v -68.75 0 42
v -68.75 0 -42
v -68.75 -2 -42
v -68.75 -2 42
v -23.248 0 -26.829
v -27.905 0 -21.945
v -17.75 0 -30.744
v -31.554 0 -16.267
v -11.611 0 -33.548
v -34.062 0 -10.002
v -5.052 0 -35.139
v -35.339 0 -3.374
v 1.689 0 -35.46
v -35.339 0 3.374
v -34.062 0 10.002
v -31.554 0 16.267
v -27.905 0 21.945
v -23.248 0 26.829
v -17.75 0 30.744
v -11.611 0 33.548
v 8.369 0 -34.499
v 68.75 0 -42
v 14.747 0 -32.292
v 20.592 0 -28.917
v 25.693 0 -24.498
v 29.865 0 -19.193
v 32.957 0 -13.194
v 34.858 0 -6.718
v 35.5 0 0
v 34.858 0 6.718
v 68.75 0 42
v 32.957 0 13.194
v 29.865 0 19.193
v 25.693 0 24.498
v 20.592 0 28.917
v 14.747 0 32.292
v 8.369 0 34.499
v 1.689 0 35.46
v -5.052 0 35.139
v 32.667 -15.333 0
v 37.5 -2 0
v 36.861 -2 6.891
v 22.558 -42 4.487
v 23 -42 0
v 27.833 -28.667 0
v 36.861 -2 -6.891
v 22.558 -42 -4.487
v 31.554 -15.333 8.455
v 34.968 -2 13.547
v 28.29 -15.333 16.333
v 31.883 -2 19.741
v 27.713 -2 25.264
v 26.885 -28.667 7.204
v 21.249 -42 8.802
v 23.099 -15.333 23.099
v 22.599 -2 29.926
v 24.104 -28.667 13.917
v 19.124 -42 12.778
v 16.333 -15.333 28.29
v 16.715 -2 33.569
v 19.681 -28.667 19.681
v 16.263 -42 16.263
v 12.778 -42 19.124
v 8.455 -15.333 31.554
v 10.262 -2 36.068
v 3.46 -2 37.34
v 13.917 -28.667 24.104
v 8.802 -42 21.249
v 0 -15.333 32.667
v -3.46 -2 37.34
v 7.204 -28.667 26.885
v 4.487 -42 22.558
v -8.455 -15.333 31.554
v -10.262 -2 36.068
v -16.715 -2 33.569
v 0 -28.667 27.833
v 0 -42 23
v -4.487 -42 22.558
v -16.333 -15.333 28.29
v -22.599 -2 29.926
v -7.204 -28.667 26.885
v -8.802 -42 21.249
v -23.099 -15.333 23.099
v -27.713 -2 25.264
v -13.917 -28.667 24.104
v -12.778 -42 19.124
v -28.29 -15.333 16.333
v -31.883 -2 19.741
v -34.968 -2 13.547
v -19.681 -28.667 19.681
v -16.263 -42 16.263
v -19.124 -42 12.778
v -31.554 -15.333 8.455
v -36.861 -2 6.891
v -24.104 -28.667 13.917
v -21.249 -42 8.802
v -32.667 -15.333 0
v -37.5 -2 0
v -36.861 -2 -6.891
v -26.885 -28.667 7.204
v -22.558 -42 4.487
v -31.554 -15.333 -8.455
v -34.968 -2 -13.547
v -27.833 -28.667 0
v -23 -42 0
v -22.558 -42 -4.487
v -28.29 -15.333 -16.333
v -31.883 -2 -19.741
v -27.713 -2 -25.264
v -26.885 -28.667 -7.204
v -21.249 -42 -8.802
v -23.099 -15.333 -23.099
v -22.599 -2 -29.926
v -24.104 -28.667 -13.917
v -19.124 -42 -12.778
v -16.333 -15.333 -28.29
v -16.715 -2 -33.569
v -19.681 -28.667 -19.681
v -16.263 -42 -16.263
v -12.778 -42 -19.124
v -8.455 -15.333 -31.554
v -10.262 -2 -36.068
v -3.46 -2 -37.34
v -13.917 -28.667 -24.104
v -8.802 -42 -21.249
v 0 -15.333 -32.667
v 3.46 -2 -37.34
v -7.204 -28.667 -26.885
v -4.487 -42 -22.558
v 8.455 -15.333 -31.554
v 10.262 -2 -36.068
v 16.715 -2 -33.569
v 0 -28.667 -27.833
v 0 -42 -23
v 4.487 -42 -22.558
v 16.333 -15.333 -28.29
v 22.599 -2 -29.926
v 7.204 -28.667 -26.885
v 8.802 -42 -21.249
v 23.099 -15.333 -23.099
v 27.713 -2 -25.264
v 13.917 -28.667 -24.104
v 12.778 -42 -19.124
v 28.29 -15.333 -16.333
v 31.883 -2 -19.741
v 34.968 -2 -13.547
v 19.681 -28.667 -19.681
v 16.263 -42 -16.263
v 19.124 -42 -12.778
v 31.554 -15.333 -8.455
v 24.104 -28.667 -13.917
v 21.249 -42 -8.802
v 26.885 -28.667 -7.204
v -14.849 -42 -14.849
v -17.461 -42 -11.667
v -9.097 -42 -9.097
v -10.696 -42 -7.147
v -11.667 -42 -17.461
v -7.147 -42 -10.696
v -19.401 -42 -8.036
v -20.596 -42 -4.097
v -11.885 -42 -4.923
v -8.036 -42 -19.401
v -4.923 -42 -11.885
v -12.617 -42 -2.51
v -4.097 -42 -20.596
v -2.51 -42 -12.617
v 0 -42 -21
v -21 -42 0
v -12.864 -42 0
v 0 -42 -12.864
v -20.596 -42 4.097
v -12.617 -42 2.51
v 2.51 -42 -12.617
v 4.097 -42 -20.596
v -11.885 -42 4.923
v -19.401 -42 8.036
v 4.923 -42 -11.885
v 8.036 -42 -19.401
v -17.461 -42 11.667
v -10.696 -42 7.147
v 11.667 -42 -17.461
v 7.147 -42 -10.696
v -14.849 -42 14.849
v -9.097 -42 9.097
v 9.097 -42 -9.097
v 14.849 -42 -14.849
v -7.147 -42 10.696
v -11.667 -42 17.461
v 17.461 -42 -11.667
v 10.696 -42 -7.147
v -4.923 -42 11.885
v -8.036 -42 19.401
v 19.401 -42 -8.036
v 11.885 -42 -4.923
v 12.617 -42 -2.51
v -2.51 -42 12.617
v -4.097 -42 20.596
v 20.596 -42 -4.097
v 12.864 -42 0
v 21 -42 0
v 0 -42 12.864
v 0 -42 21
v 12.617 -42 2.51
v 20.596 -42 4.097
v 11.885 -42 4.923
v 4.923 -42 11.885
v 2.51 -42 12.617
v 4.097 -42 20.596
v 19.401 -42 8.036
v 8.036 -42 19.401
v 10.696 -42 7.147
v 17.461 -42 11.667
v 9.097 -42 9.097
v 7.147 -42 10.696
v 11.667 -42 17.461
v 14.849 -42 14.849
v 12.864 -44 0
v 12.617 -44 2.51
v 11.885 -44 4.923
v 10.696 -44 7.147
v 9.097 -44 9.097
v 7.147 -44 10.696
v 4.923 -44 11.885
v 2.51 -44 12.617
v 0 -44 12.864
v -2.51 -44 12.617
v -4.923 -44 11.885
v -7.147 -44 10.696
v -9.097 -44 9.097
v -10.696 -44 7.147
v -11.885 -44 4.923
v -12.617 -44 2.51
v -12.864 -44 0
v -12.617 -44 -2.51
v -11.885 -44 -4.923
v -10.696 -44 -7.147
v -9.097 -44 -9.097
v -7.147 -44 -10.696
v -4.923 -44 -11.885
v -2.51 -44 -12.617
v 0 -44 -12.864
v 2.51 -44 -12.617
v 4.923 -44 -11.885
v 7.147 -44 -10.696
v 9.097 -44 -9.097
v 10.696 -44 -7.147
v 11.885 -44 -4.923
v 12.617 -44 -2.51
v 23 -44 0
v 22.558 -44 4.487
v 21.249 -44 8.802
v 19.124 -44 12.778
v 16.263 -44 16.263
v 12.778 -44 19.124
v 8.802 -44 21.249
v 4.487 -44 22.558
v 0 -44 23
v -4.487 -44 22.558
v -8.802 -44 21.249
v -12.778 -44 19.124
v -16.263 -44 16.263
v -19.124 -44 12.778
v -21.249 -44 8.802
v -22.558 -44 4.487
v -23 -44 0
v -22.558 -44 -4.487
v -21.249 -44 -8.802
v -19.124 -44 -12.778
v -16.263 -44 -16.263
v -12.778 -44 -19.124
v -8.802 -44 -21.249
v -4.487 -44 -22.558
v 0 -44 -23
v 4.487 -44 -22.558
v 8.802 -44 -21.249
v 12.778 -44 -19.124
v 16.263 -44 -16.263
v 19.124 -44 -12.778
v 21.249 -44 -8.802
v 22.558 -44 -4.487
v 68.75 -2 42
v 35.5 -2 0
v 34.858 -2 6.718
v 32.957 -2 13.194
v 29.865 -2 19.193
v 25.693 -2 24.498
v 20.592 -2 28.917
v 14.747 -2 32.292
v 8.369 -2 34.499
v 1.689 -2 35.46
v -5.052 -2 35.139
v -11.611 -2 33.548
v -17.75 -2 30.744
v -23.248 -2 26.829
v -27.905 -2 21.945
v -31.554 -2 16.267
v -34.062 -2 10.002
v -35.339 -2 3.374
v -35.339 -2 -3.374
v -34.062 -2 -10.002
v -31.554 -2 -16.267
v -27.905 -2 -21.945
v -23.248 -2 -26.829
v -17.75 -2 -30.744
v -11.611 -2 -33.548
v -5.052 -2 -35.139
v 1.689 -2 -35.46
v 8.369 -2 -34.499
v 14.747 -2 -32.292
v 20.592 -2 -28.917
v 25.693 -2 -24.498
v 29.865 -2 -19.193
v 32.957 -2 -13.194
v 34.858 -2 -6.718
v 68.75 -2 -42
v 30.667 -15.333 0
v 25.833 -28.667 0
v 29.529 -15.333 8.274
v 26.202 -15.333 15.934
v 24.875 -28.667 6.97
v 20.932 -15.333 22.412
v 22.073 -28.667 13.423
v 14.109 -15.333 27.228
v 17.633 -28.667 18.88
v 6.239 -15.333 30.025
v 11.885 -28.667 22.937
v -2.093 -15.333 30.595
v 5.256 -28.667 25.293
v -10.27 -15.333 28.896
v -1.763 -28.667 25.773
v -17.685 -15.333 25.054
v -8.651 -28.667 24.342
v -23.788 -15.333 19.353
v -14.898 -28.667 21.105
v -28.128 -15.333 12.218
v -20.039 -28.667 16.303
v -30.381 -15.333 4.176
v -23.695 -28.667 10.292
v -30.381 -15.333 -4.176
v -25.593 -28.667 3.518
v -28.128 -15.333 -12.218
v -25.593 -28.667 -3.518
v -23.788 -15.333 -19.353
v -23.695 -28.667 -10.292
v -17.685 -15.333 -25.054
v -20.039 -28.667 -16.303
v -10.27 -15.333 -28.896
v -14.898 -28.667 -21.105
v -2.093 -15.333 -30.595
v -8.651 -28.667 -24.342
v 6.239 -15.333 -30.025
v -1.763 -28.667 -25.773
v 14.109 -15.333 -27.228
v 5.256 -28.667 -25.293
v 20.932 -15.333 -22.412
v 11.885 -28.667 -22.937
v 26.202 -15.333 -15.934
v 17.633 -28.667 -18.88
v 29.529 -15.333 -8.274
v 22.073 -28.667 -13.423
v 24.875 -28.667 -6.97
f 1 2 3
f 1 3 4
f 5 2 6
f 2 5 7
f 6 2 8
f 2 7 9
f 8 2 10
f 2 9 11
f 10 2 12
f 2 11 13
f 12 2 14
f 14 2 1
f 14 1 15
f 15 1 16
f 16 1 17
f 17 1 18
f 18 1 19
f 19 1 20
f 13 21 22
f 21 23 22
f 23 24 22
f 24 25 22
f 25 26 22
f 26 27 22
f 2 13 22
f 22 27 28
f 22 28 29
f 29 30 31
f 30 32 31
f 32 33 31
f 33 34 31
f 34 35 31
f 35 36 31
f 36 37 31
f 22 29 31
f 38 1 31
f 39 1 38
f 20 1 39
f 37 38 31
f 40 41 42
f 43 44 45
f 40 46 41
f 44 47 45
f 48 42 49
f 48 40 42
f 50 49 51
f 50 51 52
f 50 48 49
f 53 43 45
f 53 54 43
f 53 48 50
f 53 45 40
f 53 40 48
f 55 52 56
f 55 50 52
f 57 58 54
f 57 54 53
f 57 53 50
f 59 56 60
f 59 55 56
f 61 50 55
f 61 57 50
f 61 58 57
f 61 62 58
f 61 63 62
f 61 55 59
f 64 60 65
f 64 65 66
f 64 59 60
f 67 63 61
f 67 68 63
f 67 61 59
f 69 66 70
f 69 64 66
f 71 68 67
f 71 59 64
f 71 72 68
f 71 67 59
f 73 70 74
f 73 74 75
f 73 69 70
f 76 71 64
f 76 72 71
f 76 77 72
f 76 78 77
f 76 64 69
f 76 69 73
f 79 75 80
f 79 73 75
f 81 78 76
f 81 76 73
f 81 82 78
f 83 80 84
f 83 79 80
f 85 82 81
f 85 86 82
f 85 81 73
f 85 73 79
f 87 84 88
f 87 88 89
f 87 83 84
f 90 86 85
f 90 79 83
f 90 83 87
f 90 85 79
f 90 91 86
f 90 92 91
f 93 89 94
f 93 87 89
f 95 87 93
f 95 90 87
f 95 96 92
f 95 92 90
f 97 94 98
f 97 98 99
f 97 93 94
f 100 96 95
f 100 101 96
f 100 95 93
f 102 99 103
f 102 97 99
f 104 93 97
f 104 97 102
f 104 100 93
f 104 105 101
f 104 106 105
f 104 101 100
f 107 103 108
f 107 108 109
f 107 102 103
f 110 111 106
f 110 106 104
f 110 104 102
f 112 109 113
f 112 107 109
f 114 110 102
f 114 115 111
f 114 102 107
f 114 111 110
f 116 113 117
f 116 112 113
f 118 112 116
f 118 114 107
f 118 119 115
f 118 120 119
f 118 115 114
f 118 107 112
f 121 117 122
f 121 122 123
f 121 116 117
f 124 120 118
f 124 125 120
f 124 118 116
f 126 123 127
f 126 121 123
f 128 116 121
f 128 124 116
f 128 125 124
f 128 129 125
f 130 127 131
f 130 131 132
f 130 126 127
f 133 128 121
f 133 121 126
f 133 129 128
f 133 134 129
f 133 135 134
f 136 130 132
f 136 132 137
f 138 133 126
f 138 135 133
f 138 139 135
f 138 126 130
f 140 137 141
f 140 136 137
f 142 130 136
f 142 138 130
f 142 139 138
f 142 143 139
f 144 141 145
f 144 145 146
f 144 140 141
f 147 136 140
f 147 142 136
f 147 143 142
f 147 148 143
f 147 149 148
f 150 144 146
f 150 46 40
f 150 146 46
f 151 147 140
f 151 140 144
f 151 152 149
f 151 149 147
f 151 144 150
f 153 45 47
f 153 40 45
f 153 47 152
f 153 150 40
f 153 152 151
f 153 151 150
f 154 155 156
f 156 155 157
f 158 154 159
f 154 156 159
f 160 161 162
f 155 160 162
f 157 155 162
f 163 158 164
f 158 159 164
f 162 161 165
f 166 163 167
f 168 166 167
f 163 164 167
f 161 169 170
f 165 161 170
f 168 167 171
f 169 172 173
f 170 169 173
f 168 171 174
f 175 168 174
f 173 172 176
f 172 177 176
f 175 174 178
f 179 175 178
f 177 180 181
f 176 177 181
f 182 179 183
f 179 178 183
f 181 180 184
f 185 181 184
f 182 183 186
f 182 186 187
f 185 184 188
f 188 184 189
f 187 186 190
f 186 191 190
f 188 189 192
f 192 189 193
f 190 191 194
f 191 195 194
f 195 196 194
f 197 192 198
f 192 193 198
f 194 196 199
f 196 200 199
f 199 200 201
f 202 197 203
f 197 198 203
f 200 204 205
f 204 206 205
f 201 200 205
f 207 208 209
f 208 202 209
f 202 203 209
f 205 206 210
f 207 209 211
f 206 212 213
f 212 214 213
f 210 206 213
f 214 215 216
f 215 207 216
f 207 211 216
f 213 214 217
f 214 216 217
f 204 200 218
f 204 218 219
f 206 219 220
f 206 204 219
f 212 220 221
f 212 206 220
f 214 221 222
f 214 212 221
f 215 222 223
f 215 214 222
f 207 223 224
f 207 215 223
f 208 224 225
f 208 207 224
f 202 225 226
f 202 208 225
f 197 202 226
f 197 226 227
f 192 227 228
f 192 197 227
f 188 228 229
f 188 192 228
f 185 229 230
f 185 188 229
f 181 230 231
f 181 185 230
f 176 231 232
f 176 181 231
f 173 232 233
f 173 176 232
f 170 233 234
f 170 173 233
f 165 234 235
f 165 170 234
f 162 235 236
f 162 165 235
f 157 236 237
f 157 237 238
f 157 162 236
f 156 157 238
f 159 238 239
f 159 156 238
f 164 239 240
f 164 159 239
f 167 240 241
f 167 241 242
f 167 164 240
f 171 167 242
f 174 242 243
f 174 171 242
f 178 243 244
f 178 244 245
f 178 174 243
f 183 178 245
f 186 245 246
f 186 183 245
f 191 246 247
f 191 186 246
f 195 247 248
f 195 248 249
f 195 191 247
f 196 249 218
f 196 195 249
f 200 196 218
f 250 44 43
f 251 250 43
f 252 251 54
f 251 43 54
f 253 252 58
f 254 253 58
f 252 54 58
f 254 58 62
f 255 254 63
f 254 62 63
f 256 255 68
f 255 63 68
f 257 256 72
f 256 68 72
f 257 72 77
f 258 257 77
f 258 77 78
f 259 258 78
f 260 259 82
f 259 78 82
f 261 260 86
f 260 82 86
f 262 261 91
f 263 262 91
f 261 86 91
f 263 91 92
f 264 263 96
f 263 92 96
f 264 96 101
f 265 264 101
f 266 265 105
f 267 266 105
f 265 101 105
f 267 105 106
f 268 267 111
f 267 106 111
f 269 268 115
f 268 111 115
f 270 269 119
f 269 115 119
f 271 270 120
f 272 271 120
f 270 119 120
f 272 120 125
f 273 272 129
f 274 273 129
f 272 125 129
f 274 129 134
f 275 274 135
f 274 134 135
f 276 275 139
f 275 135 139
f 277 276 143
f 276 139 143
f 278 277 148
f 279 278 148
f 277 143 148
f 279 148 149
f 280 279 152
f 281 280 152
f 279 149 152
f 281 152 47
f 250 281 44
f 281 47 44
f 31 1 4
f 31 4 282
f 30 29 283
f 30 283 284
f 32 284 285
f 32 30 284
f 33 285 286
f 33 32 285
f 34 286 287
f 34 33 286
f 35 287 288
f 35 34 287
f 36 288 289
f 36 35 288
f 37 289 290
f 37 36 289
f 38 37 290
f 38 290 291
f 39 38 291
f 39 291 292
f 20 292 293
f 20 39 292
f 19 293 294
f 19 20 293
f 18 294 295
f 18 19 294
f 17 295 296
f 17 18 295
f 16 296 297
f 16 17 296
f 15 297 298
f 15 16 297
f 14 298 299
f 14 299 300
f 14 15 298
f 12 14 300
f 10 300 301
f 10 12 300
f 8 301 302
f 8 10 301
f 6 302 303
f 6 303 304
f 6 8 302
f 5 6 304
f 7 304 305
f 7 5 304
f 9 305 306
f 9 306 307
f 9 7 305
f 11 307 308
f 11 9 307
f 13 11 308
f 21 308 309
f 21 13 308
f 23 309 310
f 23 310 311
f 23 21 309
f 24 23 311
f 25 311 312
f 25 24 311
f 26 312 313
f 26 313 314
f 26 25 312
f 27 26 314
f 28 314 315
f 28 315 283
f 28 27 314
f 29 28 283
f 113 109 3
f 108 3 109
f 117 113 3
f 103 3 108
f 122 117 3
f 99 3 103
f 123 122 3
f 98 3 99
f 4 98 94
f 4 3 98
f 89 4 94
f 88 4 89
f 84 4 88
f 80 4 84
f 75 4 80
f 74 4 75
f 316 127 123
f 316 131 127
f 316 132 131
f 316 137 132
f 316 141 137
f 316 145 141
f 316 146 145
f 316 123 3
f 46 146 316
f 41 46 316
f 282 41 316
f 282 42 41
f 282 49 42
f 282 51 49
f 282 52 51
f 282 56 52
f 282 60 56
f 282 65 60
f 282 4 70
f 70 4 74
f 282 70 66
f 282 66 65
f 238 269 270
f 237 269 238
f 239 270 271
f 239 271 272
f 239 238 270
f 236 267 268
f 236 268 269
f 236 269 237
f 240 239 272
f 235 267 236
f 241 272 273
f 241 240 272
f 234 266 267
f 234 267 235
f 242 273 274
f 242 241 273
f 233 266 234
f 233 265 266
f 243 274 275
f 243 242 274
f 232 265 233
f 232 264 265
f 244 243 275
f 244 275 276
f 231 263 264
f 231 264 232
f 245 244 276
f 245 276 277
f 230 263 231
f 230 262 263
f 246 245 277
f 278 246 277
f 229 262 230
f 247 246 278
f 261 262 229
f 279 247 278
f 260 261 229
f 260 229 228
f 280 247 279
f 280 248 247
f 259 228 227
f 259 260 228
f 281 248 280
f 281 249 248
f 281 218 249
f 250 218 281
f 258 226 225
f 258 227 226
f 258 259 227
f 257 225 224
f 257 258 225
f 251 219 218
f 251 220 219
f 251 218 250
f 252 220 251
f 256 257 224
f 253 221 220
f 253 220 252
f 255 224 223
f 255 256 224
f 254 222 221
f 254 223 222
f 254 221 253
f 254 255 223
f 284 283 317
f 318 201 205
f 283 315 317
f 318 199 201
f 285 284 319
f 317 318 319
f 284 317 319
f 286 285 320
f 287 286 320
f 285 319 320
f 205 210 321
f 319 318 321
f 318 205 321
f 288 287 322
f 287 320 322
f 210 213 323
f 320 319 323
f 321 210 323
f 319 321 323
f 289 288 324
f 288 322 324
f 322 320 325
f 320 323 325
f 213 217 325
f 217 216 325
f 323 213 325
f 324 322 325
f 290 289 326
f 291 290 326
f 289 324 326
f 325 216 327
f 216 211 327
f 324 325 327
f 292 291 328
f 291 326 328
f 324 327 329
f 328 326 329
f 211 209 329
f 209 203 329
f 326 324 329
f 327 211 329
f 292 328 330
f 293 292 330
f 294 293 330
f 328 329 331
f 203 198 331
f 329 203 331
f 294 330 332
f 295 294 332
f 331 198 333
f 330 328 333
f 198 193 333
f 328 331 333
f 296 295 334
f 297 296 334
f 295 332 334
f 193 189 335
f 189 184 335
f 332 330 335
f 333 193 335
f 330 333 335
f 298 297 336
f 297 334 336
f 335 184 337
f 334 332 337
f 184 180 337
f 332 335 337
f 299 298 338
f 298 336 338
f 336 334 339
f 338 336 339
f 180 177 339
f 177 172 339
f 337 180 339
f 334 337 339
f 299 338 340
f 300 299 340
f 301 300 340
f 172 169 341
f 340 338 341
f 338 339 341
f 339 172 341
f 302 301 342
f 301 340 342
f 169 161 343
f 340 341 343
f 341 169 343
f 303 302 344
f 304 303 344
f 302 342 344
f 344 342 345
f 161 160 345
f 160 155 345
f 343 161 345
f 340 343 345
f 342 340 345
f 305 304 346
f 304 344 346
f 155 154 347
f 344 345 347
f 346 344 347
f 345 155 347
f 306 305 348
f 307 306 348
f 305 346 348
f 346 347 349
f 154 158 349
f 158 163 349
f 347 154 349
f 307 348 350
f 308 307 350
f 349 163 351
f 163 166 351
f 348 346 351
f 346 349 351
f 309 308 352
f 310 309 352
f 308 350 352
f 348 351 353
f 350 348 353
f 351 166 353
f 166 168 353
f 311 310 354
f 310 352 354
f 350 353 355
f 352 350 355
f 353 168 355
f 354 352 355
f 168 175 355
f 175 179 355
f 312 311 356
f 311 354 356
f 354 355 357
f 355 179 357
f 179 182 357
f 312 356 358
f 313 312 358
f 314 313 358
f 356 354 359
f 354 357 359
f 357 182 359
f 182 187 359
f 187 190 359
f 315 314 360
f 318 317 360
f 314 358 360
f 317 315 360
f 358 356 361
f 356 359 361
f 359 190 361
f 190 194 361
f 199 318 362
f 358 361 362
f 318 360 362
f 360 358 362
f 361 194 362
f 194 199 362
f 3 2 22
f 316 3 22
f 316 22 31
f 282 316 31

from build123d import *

# Parameters (mm, degrees)
F0_W      = 137.5
F0_H      = 84
F0_R      = 35.5
F1_DEPTH  = 2
F2_R      = 37.5
F4_R      = 23
F6_R      = 35.5
F7_R      = 21
F9_R      = 23
F9_R_2    = 12.864396
F10_DEPTH = 2


with BuildPart() as f1:
    # F0 (on Front) → F1 (new body)
    with BuildSketch(Plane.XZ):
        Rectangle(F0_W, F0_H)
        Circle(F0_R, mode=Mode.SUBTRACT)
    extrude(amount=F1_DEPTH)

    # F2 (on face) → F5 section 0
    with BuildSketch(Plane.XZ.offset(2)):
        Circle(F2_R)
    # F4 (on offset) → F5 section 1
    with BuildSketch(Plane.XZ.offset(42)):
        Circle(F4_R)
    loft()

    # F6 (on face) → F8 section 0
    with BuildSketch(Plane.XZ.offset(2)):
        Circle(F6_R)
    # F7 (on face) → F8 section 1
    with BuildSketch(Plane.XZ.offset(42)):
        Circle(F7_R)
    loft(mode=Mode.SUBTRACT)

    # F9 (on offset) → F10 (join)
    with BuildSketch(Plane.XZ.offset(42)):
        Circle(F9_R)
        Circle(F9_R_2, mode=Mode.SUBTRACT)
    extrude(amount=F10_DEPTH)


solid = f1.part
